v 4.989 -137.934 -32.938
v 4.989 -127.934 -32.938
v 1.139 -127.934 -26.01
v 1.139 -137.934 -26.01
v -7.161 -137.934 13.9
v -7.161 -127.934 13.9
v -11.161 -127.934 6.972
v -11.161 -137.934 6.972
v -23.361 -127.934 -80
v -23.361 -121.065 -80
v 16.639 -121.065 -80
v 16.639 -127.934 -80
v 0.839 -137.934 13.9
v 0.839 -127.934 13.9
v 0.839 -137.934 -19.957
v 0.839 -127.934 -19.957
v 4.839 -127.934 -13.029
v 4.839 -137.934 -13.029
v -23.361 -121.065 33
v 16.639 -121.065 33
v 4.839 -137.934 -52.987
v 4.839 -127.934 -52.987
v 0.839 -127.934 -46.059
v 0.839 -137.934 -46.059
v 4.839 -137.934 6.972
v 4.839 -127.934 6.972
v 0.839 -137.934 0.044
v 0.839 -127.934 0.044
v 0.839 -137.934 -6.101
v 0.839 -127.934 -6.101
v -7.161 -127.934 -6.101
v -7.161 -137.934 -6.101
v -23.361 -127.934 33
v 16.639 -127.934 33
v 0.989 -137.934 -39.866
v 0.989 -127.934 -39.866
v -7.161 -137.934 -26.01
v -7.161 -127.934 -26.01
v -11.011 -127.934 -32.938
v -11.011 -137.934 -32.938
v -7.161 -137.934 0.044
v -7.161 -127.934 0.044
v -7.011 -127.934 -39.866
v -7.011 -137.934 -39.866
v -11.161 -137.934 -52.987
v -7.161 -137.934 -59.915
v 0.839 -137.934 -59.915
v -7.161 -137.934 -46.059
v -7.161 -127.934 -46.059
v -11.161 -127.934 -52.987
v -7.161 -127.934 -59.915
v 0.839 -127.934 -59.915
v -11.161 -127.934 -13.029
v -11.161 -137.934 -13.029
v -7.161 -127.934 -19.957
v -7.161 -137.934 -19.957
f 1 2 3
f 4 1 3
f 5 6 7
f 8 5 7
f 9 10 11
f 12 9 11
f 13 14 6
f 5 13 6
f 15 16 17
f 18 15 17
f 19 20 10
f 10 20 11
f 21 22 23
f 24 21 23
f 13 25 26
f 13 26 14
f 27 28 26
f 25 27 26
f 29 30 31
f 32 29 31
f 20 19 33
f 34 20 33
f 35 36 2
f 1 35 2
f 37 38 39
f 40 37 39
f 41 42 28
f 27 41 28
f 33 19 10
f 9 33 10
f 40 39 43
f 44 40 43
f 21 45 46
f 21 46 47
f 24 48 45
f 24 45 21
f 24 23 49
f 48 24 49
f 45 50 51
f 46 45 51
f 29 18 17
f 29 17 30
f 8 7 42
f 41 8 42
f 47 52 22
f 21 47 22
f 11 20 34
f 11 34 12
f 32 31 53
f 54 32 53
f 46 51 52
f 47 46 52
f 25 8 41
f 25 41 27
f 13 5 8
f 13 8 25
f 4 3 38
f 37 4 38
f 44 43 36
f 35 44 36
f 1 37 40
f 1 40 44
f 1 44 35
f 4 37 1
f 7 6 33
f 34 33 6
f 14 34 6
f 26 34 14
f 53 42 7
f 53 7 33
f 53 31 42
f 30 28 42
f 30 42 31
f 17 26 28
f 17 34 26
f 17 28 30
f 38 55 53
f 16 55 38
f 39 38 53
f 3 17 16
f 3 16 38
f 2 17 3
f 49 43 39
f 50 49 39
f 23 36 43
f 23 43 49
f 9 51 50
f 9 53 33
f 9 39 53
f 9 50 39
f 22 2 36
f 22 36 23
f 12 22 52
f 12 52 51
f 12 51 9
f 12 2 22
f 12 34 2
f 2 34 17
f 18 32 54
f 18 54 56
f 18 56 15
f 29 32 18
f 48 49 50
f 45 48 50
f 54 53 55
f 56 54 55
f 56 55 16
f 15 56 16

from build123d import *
from build123d.topology import SkipClean

# Parameters (mm, degrees)
SKETCH1_W               = 40
SKETCH1_H               = 40
SKETCH1_R               = 1.6
SKETCH1_R_2             = 11.25
BOSS_EXTRUDE1_DEPTH     = 8
CHAMFER2_SIZE           = 1
CHAMFER4_SIZE           = 1.3
BOSS_EXTRUDE2_DEPTH     = 5
BOSS_EXTRUDE3_DEPTH     = 40
CUT_EXTRUDE1_DEPTH      = 157.099755039
CUT_EXTRUDE1_DEPTH_BACK = 157.099755039
SKETCH6_W               = 7
SKETCH6_H               = 9.179407211
CUT_EXTRUDE2_START      = -40
SKETCH7_W               = 9.179407211
SKETCH7_H               = 6
CUT_EXTRUDE2_DEPTH      = 40
BOSS_EXTRUDE4_DEPTH     = 10
SKETCH12_W              = 108.011854904
SKETCH12_H              = 137.560499443
CUT_EXTRUDE4_DEPTH      = 165.39530252
SKETCH13_W              = 40
SKETCH13_H              = 6.869500557
BOSS_EXTRUDE7_DEPTH     = 113


with BuildPart() as part:
    # Sketch1 → Boss-Extrude1 (new body)
    with BuildSketch(Plane.XY):
        with Locations((-3.360655738, -3.504098361)):
            Rectangle(SKETCH1_W, SKETCH1_H)
        with Locations((-3.360655738, 12.745901639)):
            Circle(SKETCH1_R, mode=Mode.SUBTRACT)
        with Locations((12.889344262, -3.504098361)):
            Circle(SKETCH1_R, mode=Mode.SUBTRACT)
        with Locations((-3.360655738, -19.754098361)):
            Circle(SKETCH1_R, mode=Mode.SUBTRACT)
        with Locations((-19.610655738, -3.504098361)):
            Circle(SKETCH1_R, mode=Mode.SUBTRACT)
        with Locations((-3.360655738, -3.504098361)):
            Circle(SKETCH1_R_2, mode=Mode.SUBTRACT)
    extrude(amount=BOSS_EXTRUDE1_DEPTH)

    # Chamfer2
    chamfer2_edges = [part.edges().sort_by_distance(p)[0] for p in [
        (-4.960655738, 12.745901639, 0),
        (11.289344262, -3.504098361, 0),
        (-4.960655738, -19.754098361, 0),
        (-21.210655738, -3.504098361, 0),
    ]]
    chamfer(chamfer2_edges, length=CHAMFER2_SIZE)

    # Chamfer4
    chamfer4_edges = [part.edges().sort_by_distance(p)[0] for p in [
        (-14.610655738, -3.504098361, 0),
    ]]
    chamfer(chamfer4_edges, length=CHAMFER4_SIZE)

    # Sketch3 → Boss-Extrude2 (add)
    with SkipClean():  # the faces are left unmerged after this step: merging them gives an invalid solid
        with BuildSketch(Plane.XY.offset(8)):
            with BuildLine():
                Line((-15.860655738, -8.093801966), (-23.360655738, -8.093801966))
                Line((-23.360655738, -8.093801966), (-23.360655738, -23.504098361))
                Line((-23.360655738, -23.504098361), (-7.950359343, -23.504098361))
                Line((-7.950359343, -23.504098361), (-7.950359343, -16.004098361))
                Line((-7.950359343, -16.004098361), (-7.950359343, -13.775277495))
                ThreePointArc((-7.950359343, -13.775277495), (-11.315607026, -11.459049649), (-13.631834872, -8.093801966))
                Line((-13.631834872, -8.093801966), (-15.860655738, -8.093801966))
            make_face()
            with BuildLine():
                Line((-7.950359343, 8.995901639), (-7.950359343, 16.495901639))
                Line((-7.950359343, 16.495901639), (-23.360655738, 16.495901639))
                Line((-23.360655738, 16.495901639), (-23.360655738, 1.085605245))
                Line((-23.360655738, 1.085605245), (-15.860655738, 1.085605245))
                Line((-15.860655738, 1.085605245), (-13.631834872, 1.085605245))
                ThreePointArc((-13.631834872, 1.085605245), (-11.315607026, 4.450852928), (-7.950359343, 6.767080774))
                Line((-7.950359343, 6.767080774), (-7.950359343, 8.995901639))
            make_face()
            with BuildLine():
                Line((16.639344262, 16.495901639), (1.229047868, 16.495901639))
                Line((1.229047868, 16.495901639), (1.229047868, 8.995901639))
                Line((1.229047868, 8.995901639), (1.229047868, 6.767080774))
                ThreePointArc((1.229047868, 6.767080774), (4.594295551, 4.450852928), (6.910523397, 1.085605245))
                Line((6.910523397, 1.085605245), (9.139344262, 1.085605245))
                Line((9.139344262, 1.085605245), (16.639344262, 1.085605245))
                Line((16.639344262, 1.085605245), (16.639344262, 16.495901639))
            make_face()
            with BuildLine():
                Line((16.639344262, -23.504098361), (16.639344262, -8.093801966))
                Line((16.639344262, -8.093801966), (9.139344262, -8.093801966))
                Line((9.139344262, -8.093801966), (6.910523397, -8.093801966))
                ThreePointArc((6.910523397, -8.093801966), (4.594295551, -11.459049649), (1.229047868, -13.775277495))
                Line((1.229047868, -13.775277495), (1.229047868, -16.004098361))
                Line((1.229047868, -16.004098361), (1.229047868, -23.504098361))
                Line((1.229047868, -23.504098361), (16.639344262, -23.504098361))
            make_face()
        extrude(amount=BOSS_EXTRUDE2_DEPTH)

    # Sketch5 → Boss-Extrude3 (add)
    with SkipClean():  # the faces are left unmerged after this step: merging them gives an invalid solid
        with BuildSketch(Plane(origin=(16.639344262, 0, 0), x_dir=(0, 0, -1), z_dir=(1, 0, 0))):
            with BuildLine():
                Line((-13, 16.495901639), (-23, 16.495901639))
                ThreePointArc((-23, 16.495901639), (-30.071067812, 13.566969451), (-33, 6.495901639))
                Line((-33, 6.495901639), (-33, -79.864396018))
                Line((-33, -79.864396018), (-33, -127.934098361))
                Line((-33, -127.934098361), (0, -127.934098361))
                Line((0, -127.934098361), (80, -127.934098361))
                ThreePointArc((80, -127.934098361), (22.298563281, -89.279521012), (0, -23.504098361))
                Line((0, -23.504098361), (-13, -23.504098361))
                Line((-13, -23.504098361), (-13, 16.495901639))
            make_face()
        extrude(amount=-BOSS_EXTRUDE3_DEPTH)

    # Sketch6 → Cut-Extrude1 (cut, two sides: drawn at the far end of the back side and taken through both)
    with SkipClean():  # the faces are left unmerged after this step: merging them gives an invalid solid
        with BuildSketch(Plane(origin=(16.639344262, 0, 0), x_dir=(0, 0, -1), z_dir=(1, 0, 0)).offset(-CUT_EXTRUDE1_DEPTH_BACK)):
            with Locations((-16.5, -3.504098361)):
                Rectangle(SKETCH6_W, SKETCH6_H)
        extrude(amount=CUT_EXTRUDE1_DEPTH + CUT_EXTRUDE1_DEPTH_BACK, mode=Mode.SUBTRACT)

    # Sketch7 → Cut-Extrude2 (cut)
    with SkipClean():  # the faces are left unmerged after this step: merging them gives an invalid solid
        with BuildSketch(Plane(origin=(0, 16.495901639, 0), x_dir=(1, 0, 0), z_dir=(0, 1, 0)).offset(CUT_EXTRUDE2_START)):
            with Locations((-3.360655738, -16)):
                Rectangle(SKETCH7_W, SKETCH7_H)
        extrude(amount=CUT_EXTRUDE2_DEPTH, mode=Mode.SUBTRACT)

    # Sketch8 → Boss-Extrude4 (add)
    with SkipClean():  # the faces are left unmerged after this step: merging them gives an invalid solid
        with BuildSketch(Plane.XZ.offset(127.934098361)):
            Polygon((4.989344262, -32.93820323), (1.139344262, -26.01), (-7.160655738, -26.01), (-11.010655738, -32.93820323), (-7.010655738, -39.866406461), (0.989344262, -39.866406461), align=None)
            Polygon((4.839344262, -52.98679677), (0.839344262, -46.058593539), (-7.160655738, -46.058593539), (-11.160655738, -52.98679677), (-7.160655738, -59.915), (0.839344262, -59.915), align=None)
            Polygon((4.839344262, -13.02898385), (0.839344262, -6.10078062), (-7.160655738, -6.10078062), (-11.160655738, -13.02898385), (-7.160655738, -19.957187081), (0.839344262, -19.957187081), align=None)
            Polygon((4.839344262, 6.97179677), (0.839344262, 13.9), (-7.160655738, 13.9), (-11.160655738, 6.97179677), (-7.160655738, 0.043593539), (0.839344262, 0.043593539), align=None)
        extrude(amount=BOSS_EXTRUDE4_DEPTH)

    # Sketch12 → Cut-Extrude4 (cut, through all)
    with BuildSketch(Plane(origin=(16.639344262, 0, 0), x_dir=(0, 0, -1), z_dir=(1, 0, 0))):
        with Locations((21.005927452, -52.284348083)):
            Rectangle(SKETCH12_W, SKETCH12_H)
    extrude(amount=-CUT_EXTRUDE4_DEPTH, mode=Mode.SUBTRACT)

    # Sketch13 → Boss-Extrude7 (add, through all)
    with BuildSketch(Plane.XY.offset(33)):
        with Locations((-3.360655738, -124.499348083)):
            Rectangle(SKETCH13_W, SKETCH13_H)
    extrude(amount=-BOSS_EXTRUDE7_DEPTH)


solid = part.part
